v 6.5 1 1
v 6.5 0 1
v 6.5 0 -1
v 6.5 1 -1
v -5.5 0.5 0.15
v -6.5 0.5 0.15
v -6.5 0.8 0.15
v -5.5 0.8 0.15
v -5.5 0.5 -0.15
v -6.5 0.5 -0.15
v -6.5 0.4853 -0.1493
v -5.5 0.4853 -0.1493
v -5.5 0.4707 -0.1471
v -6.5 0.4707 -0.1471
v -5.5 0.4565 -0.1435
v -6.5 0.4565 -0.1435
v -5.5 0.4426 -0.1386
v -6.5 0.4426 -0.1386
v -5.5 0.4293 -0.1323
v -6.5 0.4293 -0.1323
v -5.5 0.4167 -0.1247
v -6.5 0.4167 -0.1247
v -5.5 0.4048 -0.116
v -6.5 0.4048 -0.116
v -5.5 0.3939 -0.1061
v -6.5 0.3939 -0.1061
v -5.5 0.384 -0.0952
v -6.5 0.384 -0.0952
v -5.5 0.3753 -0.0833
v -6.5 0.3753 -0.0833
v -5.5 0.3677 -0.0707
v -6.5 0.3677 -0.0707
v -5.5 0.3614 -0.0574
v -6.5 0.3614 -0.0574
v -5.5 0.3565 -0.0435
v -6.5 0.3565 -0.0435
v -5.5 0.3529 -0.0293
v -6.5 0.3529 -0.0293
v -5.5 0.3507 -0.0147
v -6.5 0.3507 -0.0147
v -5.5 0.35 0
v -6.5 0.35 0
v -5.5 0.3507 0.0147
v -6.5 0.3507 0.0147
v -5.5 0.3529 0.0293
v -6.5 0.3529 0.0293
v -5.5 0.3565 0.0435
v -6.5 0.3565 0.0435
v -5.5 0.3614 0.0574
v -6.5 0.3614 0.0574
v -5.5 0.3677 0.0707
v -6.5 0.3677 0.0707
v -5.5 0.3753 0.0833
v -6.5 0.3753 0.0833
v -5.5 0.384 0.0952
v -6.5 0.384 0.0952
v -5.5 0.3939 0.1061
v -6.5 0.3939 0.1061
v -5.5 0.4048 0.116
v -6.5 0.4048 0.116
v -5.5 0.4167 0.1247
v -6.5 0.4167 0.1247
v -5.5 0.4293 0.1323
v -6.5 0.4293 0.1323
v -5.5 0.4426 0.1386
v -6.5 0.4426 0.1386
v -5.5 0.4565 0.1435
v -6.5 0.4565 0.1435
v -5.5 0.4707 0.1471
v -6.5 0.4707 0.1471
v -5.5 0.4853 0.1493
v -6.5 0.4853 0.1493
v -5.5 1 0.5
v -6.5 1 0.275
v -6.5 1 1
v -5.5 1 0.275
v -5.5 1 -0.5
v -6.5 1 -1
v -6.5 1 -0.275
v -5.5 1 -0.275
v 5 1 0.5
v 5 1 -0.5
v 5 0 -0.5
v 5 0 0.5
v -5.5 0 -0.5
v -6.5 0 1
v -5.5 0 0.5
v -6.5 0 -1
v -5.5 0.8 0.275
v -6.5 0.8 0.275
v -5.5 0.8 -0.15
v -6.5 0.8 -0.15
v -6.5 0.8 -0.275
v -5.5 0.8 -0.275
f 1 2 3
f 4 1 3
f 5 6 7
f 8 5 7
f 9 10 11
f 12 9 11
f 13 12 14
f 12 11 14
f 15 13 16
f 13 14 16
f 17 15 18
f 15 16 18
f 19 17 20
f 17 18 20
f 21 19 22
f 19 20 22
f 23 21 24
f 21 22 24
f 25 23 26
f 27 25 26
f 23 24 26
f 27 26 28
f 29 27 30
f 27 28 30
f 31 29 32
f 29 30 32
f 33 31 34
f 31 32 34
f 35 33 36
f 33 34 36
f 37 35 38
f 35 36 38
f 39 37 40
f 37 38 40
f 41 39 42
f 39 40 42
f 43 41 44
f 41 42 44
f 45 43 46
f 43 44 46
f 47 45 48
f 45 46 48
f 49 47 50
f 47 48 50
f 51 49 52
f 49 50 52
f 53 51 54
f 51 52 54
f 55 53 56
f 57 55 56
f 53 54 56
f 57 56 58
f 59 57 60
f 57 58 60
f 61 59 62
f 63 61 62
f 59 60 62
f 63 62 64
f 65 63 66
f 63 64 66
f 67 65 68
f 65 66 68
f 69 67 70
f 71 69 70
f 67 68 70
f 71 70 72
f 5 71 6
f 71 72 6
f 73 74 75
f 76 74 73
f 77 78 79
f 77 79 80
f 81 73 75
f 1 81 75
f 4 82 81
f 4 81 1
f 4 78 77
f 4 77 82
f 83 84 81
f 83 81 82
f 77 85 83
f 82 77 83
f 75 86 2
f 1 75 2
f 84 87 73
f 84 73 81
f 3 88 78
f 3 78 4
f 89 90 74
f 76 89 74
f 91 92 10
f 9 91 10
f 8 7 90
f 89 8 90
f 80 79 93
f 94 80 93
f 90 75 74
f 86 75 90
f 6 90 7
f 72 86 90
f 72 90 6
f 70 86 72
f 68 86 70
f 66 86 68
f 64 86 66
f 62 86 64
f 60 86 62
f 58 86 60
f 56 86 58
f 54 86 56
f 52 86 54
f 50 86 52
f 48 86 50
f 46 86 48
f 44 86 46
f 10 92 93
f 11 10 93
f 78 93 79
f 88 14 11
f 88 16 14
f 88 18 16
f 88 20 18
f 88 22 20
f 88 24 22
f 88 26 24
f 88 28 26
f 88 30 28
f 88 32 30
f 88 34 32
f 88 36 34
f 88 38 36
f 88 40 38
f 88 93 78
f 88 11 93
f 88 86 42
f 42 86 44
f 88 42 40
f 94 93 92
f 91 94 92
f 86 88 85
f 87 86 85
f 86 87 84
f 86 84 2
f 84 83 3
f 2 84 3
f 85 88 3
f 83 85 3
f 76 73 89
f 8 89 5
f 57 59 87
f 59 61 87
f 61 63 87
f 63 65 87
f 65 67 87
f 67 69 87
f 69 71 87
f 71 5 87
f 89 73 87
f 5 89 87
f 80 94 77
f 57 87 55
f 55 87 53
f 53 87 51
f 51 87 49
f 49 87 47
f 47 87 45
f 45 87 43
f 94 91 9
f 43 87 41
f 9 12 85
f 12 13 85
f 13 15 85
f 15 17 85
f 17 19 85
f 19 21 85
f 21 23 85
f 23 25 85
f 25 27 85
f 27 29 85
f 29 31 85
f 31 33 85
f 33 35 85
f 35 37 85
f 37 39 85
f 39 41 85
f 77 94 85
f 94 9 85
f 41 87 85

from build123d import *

# Parameters (mm, degrees)
SKETCH1_W           = 13
SKETCH1_H           = 2
SKETCH1_W_2         = 10.5
SKETCH1_H_2         = 1
BOSS_EXTRUDE1_DEPTH = 1
CUT_EXTRUDE2_DEPTH  = 1


with BuildPart() as part:
    # Sketch1 → Boss-Extrude1 (new body)
    with BuildSketch(Plane(origin=(0, 0, 0), x_dir=(1, 0, 0), z_dir=(0, 1, 0))):
        Rectangle(SKETCH1_W, SKETCH1_H)
        with Locations((-0.25, 0)):
            Rectangle(SKETCH1_W_2, SKETCH1_H_2, mode=Mode.SUBTRACT)
    extrude(amount=BOSS_EXTRUDE1_DEPTH)

    # Sketch2 → Cut-Extrude2 (cut)
    with BuildSketch(Plane.ZY.offset(6.5)):
        with BuildLine():
            Line((0.15, 0.5), (0.15, 0.8))
            Line((0.15, 0.8), (0.275, 0.8))
            Line((0.275, 0.8), (0.275, 1))
            Line((0.275, 1), (0.15, 1))
            Line((0.15, 1), (-0.15, 1))
            Line((-0.15, 1), (-0.275, 1))
            Line((-0.275, 1), (-0.275, 0.8))
            Line((-0.275, 0.8), (-0.15, 0.8))
            Line((-0.15, 0.8), (-0.15, 0.5))
            ThreePointArc((-0.15, 0.5), (0, 0.35), (0.15, 0.5))
        make_face()
    extrude(amount=-CUT_EXTRUDE2_DEPTH, mode=Mode.SUBTRACT)


solid = part.part
